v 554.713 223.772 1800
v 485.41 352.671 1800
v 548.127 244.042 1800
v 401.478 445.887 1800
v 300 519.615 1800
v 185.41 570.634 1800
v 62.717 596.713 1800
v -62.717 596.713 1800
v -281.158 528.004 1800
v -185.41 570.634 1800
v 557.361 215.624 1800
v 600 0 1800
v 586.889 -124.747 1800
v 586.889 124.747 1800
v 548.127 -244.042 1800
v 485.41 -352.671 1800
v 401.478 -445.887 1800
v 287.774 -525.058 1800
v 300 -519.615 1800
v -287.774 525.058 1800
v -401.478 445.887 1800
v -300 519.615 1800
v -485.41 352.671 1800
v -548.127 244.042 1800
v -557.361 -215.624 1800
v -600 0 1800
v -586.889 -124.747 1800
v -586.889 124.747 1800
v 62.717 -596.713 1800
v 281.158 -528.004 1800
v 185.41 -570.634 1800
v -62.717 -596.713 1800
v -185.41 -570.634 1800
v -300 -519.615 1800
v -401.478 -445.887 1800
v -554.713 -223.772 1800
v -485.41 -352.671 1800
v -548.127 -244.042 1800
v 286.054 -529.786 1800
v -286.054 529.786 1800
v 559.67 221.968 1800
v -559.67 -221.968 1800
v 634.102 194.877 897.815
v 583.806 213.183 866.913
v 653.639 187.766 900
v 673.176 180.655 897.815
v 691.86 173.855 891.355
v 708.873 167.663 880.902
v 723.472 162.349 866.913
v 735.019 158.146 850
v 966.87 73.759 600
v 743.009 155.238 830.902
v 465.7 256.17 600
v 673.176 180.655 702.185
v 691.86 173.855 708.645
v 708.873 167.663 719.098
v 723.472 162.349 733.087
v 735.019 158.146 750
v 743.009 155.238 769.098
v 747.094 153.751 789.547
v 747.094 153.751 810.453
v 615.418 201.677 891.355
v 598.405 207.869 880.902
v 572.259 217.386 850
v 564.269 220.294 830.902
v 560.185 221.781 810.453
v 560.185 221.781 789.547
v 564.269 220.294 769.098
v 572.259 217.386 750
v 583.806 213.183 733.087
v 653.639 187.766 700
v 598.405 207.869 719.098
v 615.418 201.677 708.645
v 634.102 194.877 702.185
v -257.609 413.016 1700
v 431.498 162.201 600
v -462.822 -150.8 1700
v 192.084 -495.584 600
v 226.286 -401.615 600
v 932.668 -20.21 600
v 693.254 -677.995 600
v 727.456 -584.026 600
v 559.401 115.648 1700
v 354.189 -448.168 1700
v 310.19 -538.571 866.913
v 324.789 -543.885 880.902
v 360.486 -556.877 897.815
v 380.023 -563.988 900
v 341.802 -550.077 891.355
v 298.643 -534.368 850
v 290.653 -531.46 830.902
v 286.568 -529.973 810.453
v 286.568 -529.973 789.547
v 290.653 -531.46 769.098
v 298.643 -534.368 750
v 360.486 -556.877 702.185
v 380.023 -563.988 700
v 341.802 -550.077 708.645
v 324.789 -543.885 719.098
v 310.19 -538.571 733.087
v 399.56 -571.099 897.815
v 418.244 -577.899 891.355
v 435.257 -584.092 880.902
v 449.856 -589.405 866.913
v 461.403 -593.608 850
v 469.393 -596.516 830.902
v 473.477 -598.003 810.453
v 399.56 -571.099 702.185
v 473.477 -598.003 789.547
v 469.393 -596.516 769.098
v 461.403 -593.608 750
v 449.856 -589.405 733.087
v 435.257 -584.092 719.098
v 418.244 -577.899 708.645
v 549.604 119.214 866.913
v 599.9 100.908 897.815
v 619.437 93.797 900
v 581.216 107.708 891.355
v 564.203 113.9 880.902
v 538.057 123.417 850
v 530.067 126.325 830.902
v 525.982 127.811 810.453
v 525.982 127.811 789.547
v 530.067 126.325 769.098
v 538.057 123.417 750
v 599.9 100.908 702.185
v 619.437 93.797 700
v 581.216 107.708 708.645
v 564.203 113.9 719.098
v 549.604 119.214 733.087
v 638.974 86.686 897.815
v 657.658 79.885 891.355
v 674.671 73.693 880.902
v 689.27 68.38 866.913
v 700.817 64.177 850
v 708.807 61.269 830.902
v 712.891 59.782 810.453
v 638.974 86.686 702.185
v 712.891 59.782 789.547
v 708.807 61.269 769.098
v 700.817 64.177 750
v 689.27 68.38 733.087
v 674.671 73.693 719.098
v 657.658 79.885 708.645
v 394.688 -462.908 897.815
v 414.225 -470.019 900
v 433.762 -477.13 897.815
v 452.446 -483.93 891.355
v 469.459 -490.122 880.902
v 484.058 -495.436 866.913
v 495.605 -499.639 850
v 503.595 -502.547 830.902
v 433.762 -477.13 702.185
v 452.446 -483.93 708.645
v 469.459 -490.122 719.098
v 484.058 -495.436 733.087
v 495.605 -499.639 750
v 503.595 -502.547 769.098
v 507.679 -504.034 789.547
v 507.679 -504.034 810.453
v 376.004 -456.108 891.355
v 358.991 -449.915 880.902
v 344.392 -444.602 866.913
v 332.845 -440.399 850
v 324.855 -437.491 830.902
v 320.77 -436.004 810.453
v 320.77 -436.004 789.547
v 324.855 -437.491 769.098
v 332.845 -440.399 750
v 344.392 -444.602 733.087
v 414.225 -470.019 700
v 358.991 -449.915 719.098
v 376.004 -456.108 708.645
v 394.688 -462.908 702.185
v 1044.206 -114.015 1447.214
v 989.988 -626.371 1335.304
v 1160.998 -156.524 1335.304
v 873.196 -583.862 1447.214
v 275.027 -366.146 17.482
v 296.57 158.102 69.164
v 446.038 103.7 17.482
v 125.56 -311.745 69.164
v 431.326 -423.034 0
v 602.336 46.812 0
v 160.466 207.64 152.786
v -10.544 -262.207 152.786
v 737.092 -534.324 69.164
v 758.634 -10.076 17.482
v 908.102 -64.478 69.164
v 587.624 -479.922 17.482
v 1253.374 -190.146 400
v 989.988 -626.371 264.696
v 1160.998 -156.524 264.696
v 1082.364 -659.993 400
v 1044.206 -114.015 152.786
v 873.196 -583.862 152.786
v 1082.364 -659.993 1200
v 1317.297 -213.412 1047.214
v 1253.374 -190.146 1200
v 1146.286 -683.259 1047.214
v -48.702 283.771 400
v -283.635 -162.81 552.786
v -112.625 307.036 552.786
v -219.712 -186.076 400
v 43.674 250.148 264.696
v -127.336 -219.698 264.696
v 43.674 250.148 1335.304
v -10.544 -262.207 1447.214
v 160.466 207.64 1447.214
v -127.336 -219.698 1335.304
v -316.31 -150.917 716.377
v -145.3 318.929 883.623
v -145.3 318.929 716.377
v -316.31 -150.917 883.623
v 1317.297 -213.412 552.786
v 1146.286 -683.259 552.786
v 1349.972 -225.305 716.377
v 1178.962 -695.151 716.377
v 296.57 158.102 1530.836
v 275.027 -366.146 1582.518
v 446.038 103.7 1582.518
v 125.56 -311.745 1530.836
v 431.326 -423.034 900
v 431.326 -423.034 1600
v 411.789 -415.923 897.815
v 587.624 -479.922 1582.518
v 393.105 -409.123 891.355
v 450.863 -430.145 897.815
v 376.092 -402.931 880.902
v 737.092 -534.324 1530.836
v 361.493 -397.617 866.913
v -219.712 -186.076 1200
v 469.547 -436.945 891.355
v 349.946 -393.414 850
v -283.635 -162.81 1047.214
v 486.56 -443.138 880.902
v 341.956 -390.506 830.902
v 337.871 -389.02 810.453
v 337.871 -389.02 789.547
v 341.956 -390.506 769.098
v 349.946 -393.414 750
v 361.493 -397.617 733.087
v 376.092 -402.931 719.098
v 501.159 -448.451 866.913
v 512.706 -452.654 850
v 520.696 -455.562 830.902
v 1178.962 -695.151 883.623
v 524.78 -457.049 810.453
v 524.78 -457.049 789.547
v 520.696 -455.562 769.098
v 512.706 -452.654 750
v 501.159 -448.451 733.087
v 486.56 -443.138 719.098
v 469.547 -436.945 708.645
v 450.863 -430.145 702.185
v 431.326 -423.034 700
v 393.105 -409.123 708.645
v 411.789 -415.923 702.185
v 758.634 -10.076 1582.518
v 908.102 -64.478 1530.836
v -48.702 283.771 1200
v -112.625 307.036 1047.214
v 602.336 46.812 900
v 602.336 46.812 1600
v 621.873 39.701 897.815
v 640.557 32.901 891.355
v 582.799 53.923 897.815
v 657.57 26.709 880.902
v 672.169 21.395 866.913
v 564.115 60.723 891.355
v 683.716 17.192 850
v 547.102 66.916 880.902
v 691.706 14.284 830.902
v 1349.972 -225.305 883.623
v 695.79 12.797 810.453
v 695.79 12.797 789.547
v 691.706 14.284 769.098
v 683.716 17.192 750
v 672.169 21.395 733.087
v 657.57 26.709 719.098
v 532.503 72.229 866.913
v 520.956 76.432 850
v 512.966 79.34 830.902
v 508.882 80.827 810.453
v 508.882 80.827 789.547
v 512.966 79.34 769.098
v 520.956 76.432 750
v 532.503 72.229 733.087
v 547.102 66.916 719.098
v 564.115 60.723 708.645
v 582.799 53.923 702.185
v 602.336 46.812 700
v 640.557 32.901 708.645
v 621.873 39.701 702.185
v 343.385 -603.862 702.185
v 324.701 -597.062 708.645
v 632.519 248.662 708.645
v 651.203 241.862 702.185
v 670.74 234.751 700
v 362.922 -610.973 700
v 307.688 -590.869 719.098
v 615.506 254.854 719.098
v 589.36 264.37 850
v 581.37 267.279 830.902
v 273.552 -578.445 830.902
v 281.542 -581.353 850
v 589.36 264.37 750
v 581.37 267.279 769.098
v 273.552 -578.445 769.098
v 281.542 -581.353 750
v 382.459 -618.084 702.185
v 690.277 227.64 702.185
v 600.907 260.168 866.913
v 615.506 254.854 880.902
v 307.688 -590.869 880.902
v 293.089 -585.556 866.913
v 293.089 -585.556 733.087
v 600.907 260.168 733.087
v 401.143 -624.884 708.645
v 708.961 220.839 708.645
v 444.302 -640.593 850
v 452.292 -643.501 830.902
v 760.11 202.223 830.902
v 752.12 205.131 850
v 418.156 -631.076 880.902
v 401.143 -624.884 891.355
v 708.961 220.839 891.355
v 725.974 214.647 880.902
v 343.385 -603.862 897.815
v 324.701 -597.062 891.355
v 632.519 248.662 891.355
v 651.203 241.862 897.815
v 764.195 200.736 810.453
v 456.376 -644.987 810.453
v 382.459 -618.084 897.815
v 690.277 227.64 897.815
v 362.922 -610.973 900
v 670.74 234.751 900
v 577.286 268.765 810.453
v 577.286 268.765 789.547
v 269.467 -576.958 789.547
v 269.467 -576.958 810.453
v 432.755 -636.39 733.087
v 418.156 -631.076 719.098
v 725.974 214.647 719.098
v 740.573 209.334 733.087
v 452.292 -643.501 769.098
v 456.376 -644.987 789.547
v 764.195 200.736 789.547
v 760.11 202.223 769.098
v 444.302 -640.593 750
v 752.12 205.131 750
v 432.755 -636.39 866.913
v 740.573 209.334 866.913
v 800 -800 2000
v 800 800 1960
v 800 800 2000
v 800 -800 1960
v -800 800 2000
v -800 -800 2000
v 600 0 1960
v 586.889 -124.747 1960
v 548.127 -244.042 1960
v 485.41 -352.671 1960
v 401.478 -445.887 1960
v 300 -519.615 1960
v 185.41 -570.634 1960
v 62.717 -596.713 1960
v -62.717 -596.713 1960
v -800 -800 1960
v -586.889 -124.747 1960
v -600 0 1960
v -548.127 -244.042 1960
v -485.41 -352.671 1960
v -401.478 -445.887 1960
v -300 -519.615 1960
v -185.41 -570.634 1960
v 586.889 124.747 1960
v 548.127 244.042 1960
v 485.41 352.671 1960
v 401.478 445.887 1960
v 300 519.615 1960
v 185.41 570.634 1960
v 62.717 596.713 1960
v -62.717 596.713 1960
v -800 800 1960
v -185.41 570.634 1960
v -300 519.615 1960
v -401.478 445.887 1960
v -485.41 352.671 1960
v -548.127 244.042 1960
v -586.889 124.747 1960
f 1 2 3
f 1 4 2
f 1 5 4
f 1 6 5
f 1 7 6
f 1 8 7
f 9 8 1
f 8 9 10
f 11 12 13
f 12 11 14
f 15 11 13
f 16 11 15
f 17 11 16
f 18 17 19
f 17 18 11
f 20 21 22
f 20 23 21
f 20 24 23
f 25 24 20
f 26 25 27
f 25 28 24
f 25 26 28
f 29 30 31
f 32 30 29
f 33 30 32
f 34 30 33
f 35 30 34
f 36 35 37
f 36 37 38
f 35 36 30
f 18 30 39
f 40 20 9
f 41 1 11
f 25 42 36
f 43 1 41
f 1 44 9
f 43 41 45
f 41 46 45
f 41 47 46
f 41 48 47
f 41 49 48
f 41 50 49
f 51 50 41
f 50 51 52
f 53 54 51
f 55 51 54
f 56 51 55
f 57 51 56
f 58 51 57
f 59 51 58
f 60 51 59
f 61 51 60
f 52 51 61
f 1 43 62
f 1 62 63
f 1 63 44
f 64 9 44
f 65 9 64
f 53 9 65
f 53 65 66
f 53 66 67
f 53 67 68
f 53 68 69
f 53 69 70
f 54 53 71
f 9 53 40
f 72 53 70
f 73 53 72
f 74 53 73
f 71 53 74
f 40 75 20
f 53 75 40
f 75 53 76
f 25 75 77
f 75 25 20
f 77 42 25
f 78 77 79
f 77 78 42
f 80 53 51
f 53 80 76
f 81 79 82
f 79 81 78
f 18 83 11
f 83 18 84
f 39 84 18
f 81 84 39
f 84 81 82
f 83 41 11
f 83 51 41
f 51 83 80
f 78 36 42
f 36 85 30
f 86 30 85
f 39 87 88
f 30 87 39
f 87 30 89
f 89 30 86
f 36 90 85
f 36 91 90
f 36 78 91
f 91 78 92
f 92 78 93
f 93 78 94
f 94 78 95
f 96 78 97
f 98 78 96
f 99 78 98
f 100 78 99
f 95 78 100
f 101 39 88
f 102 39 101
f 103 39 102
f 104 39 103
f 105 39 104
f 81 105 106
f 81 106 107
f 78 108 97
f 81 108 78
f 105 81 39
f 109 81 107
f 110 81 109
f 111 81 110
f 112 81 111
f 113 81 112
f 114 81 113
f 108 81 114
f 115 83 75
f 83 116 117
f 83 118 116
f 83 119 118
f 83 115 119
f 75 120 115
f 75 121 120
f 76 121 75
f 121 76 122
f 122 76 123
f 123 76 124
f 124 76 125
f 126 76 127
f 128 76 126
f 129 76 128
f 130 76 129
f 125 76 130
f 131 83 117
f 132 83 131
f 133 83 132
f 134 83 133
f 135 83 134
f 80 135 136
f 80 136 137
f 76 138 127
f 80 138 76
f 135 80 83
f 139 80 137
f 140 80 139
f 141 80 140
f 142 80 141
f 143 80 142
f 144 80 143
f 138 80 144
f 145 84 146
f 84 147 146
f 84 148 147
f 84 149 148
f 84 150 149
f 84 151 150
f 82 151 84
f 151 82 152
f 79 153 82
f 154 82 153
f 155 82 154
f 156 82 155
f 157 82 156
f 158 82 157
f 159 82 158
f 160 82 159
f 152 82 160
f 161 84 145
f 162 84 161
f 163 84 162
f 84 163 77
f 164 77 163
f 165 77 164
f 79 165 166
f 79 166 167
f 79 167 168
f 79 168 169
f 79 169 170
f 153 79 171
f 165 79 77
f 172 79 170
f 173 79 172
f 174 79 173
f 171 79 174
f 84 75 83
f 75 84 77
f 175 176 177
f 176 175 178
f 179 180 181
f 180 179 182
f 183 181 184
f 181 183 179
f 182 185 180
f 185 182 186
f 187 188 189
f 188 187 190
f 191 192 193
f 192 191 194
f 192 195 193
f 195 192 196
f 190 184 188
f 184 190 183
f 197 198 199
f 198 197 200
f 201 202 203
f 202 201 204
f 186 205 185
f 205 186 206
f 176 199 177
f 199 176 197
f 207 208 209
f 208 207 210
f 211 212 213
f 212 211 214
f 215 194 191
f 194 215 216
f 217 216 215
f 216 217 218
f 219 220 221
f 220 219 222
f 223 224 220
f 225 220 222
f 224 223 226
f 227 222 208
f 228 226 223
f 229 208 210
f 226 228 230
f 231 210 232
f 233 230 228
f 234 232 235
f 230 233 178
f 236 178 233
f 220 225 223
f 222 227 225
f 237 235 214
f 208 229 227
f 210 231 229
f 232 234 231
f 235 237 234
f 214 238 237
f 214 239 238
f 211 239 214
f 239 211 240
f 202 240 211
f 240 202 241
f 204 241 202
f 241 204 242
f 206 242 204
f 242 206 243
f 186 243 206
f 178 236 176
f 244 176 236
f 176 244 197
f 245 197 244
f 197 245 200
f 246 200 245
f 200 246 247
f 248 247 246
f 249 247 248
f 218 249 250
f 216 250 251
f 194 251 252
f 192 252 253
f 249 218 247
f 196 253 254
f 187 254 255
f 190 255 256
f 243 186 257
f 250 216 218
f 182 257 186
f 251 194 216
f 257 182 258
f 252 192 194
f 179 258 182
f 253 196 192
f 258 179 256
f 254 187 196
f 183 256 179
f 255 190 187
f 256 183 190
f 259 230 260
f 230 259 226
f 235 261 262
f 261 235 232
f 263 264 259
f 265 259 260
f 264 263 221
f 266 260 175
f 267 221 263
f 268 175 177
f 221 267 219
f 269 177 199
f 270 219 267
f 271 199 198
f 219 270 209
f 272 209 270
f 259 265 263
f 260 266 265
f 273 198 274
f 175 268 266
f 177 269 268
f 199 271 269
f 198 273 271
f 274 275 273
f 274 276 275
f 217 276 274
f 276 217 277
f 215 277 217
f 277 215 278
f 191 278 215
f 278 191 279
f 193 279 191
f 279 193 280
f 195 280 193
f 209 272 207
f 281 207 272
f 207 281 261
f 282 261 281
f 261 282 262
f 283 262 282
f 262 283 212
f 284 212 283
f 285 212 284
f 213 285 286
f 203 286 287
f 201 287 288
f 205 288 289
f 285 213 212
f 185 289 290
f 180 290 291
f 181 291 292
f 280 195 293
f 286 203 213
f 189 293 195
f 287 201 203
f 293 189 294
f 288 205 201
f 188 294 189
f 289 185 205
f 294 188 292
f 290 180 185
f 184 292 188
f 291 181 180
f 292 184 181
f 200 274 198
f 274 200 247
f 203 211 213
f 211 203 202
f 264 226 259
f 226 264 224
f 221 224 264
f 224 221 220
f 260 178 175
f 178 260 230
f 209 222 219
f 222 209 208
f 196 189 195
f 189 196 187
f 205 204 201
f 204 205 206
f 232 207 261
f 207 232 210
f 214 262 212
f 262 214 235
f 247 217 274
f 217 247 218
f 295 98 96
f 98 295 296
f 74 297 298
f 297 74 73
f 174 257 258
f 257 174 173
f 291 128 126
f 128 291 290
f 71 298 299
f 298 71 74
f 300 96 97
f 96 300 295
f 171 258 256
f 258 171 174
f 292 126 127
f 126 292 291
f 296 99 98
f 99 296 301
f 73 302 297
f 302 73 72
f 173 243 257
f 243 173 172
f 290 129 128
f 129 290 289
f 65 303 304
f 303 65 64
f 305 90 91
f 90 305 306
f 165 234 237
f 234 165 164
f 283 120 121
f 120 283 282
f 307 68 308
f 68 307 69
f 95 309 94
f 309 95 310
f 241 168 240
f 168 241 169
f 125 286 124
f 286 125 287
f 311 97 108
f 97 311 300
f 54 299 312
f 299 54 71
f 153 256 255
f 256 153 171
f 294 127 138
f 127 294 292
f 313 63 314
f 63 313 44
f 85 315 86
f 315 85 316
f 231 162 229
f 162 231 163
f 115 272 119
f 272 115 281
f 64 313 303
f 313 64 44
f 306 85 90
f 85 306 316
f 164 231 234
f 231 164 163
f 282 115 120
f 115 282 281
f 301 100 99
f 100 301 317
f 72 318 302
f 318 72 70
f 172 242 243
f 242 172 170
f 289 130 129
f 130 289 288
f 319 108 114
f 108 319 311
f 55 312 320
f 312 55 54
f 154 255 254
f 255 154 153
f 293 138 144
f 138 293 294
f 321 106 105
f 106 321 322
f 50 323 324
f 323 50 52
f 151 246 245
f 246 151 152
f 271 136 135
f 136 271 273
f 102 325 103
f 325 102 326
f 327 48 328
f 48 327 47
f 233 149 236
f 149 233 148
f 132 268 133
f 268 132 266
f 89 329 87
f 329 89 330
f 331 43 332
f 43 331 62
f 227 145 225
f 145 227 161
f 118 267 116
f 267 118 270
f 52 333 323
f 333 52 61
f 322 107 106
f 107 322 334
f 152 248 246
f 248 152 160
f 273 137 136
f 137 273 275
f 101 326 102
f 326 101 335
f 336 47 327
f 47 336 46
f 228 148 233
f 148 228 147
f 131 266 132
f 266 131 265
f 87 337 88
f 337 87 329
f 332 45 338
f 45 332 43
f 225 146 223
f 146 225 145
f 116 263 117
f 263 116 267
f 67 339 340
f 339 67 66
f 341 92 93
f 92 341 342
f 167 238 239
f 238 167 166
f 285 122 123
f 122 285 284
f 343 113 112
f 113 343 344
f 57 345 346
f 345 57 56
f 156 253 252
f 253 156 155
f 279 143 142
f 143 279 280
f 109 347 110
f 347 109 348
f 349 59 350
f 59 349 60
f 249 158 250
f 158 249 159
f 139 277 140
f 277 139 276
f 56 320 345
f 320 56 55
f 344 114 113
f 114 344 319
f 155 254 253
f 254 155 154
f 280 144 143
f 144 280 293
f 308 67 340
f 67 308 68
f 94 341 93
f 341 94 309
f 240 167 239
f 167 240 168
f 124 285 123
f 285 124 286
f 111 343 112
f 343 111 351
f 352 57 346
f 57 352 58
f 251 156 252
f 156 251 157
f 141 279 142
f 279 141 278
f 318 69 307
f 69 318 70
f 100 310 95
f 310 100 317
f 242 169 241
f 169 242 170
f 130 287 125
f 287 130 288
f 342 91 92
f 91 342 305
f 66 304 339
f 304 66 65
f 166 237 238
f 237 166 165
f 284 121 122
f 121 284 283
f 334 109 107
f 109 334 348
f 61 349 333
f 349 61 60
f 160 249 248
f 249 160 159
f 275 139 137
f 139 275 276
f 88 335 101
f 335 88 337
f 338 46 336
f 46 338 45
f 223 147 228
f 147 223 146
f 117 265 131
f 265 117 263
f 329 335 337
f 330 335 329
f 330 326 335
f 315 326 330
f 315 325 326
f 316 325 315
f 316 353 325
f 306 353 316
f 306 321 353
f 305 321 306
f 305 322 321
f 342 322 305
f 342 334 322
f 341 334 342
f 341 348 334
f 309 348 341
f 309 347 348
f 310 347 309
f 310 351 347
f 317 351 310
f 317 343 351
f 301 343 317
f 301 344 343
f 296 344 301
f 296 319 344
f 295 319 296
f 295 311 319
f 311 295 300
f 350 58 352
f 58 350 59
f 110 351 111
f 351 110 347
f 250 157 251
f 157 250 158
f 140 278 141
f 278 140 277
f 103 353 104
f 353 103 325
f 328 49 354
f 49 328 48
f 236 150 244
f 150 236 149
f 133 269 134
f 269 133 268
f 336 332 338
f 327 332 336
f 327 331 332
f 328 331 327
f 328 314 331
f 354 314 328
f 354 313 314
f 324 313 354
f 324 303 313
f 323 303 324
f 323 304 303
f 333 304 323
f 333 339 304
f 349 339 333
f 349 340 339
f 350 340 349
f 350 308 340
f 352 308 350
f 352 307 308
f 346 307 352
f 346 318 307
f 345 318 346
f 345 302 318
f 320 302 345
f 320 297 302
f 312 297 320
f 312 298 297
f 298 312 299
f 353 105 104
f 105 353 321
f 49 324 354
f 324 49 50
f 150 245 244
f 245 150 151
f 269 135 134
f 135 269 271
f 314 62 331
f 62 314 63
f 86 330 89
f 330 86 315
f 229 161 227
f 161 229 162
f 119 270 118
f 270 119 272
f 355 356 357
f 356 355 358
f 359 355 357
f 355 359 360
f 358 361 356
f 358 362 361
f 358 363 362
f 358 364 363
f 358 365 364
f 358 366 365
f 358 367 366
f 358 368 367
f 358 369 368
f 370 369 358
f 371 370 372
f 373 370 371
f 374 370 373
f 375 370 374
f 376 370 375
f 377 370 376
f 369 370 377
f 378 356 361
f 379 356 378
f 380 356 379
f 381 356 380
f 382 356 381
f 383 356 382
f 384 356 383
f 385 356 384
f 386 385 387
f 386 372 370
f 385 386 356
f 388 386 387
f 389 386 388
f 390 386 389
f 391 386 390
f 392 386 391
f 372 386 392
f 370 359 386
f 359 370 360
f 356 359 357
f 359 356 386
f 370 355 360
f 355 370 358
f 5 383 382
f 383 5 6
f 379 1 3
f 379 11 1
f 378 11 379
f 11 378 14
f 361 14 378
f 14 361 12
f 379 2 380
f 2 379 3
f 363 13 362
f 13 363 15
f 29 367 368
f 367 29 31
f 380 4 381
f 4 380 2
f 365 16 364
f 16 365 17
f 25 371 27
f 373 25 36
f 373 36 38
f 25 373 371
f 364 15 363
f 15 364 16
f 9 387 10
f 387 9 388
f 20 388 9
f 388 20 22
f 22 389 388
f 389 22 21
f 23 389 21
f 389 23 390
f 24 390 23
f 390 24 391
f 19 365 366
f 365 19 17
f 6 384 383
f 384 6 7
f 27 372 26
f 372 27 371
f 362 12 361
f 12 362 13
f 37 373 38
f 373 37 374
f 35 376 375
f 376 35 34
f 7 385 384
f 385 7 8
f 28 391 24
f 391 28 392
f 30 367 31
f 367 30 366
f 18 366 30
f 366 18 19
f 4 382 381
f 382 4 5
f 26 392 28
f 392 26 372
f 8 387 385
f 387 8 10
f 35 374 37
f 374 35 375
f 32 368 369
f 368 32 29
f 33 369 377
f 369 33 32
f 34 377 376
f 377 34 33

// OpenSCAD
height=2000;
rotation=70;

module pivoting_caster(h=height, r=rotation) {
    
    translate([-0.4*h,-0.4*h,49/50*h])
        cube([0.8*h,0.8*h,h/50]);
    translate([0,0,0.9*h])
        cylinder(h/10,0.3*h,0.3*h);
    translate([0,0,0.4*h])
    rotate([0,0,r])
        translate([0,-0.275*h,0])
            rotate([0,90,0])
                union(){
                cylinder(0.25*h,0.4*h,0.4*h,true);
            translate([0,0,-0.20*h])
                difference() {
                    linear_extrude(0.40*h)
                        polygon([[h/-2,h/2],[h/-2,h/20],[h/10,h/-6],[h/10,h/10]]);
                    translate([-0.45*h,h/-2,h/20])
                        cube([h,h,0.3*h]);
                }
                cylinder(0.45*h,0.05*h,0.05*h,true);
                }       
}
    
    /*
        difference() {
                linear_extrude(0.4*h)
                    polygon([[h/-2,h/2],[h/-2,h/20],[h/10,h/-6],[h/10,h/10]]);
                translate([-0.45*h,h/-2,h/20])
                    cube([h,h,0.3*h]);
        }
}*/
pivoting_caster();
